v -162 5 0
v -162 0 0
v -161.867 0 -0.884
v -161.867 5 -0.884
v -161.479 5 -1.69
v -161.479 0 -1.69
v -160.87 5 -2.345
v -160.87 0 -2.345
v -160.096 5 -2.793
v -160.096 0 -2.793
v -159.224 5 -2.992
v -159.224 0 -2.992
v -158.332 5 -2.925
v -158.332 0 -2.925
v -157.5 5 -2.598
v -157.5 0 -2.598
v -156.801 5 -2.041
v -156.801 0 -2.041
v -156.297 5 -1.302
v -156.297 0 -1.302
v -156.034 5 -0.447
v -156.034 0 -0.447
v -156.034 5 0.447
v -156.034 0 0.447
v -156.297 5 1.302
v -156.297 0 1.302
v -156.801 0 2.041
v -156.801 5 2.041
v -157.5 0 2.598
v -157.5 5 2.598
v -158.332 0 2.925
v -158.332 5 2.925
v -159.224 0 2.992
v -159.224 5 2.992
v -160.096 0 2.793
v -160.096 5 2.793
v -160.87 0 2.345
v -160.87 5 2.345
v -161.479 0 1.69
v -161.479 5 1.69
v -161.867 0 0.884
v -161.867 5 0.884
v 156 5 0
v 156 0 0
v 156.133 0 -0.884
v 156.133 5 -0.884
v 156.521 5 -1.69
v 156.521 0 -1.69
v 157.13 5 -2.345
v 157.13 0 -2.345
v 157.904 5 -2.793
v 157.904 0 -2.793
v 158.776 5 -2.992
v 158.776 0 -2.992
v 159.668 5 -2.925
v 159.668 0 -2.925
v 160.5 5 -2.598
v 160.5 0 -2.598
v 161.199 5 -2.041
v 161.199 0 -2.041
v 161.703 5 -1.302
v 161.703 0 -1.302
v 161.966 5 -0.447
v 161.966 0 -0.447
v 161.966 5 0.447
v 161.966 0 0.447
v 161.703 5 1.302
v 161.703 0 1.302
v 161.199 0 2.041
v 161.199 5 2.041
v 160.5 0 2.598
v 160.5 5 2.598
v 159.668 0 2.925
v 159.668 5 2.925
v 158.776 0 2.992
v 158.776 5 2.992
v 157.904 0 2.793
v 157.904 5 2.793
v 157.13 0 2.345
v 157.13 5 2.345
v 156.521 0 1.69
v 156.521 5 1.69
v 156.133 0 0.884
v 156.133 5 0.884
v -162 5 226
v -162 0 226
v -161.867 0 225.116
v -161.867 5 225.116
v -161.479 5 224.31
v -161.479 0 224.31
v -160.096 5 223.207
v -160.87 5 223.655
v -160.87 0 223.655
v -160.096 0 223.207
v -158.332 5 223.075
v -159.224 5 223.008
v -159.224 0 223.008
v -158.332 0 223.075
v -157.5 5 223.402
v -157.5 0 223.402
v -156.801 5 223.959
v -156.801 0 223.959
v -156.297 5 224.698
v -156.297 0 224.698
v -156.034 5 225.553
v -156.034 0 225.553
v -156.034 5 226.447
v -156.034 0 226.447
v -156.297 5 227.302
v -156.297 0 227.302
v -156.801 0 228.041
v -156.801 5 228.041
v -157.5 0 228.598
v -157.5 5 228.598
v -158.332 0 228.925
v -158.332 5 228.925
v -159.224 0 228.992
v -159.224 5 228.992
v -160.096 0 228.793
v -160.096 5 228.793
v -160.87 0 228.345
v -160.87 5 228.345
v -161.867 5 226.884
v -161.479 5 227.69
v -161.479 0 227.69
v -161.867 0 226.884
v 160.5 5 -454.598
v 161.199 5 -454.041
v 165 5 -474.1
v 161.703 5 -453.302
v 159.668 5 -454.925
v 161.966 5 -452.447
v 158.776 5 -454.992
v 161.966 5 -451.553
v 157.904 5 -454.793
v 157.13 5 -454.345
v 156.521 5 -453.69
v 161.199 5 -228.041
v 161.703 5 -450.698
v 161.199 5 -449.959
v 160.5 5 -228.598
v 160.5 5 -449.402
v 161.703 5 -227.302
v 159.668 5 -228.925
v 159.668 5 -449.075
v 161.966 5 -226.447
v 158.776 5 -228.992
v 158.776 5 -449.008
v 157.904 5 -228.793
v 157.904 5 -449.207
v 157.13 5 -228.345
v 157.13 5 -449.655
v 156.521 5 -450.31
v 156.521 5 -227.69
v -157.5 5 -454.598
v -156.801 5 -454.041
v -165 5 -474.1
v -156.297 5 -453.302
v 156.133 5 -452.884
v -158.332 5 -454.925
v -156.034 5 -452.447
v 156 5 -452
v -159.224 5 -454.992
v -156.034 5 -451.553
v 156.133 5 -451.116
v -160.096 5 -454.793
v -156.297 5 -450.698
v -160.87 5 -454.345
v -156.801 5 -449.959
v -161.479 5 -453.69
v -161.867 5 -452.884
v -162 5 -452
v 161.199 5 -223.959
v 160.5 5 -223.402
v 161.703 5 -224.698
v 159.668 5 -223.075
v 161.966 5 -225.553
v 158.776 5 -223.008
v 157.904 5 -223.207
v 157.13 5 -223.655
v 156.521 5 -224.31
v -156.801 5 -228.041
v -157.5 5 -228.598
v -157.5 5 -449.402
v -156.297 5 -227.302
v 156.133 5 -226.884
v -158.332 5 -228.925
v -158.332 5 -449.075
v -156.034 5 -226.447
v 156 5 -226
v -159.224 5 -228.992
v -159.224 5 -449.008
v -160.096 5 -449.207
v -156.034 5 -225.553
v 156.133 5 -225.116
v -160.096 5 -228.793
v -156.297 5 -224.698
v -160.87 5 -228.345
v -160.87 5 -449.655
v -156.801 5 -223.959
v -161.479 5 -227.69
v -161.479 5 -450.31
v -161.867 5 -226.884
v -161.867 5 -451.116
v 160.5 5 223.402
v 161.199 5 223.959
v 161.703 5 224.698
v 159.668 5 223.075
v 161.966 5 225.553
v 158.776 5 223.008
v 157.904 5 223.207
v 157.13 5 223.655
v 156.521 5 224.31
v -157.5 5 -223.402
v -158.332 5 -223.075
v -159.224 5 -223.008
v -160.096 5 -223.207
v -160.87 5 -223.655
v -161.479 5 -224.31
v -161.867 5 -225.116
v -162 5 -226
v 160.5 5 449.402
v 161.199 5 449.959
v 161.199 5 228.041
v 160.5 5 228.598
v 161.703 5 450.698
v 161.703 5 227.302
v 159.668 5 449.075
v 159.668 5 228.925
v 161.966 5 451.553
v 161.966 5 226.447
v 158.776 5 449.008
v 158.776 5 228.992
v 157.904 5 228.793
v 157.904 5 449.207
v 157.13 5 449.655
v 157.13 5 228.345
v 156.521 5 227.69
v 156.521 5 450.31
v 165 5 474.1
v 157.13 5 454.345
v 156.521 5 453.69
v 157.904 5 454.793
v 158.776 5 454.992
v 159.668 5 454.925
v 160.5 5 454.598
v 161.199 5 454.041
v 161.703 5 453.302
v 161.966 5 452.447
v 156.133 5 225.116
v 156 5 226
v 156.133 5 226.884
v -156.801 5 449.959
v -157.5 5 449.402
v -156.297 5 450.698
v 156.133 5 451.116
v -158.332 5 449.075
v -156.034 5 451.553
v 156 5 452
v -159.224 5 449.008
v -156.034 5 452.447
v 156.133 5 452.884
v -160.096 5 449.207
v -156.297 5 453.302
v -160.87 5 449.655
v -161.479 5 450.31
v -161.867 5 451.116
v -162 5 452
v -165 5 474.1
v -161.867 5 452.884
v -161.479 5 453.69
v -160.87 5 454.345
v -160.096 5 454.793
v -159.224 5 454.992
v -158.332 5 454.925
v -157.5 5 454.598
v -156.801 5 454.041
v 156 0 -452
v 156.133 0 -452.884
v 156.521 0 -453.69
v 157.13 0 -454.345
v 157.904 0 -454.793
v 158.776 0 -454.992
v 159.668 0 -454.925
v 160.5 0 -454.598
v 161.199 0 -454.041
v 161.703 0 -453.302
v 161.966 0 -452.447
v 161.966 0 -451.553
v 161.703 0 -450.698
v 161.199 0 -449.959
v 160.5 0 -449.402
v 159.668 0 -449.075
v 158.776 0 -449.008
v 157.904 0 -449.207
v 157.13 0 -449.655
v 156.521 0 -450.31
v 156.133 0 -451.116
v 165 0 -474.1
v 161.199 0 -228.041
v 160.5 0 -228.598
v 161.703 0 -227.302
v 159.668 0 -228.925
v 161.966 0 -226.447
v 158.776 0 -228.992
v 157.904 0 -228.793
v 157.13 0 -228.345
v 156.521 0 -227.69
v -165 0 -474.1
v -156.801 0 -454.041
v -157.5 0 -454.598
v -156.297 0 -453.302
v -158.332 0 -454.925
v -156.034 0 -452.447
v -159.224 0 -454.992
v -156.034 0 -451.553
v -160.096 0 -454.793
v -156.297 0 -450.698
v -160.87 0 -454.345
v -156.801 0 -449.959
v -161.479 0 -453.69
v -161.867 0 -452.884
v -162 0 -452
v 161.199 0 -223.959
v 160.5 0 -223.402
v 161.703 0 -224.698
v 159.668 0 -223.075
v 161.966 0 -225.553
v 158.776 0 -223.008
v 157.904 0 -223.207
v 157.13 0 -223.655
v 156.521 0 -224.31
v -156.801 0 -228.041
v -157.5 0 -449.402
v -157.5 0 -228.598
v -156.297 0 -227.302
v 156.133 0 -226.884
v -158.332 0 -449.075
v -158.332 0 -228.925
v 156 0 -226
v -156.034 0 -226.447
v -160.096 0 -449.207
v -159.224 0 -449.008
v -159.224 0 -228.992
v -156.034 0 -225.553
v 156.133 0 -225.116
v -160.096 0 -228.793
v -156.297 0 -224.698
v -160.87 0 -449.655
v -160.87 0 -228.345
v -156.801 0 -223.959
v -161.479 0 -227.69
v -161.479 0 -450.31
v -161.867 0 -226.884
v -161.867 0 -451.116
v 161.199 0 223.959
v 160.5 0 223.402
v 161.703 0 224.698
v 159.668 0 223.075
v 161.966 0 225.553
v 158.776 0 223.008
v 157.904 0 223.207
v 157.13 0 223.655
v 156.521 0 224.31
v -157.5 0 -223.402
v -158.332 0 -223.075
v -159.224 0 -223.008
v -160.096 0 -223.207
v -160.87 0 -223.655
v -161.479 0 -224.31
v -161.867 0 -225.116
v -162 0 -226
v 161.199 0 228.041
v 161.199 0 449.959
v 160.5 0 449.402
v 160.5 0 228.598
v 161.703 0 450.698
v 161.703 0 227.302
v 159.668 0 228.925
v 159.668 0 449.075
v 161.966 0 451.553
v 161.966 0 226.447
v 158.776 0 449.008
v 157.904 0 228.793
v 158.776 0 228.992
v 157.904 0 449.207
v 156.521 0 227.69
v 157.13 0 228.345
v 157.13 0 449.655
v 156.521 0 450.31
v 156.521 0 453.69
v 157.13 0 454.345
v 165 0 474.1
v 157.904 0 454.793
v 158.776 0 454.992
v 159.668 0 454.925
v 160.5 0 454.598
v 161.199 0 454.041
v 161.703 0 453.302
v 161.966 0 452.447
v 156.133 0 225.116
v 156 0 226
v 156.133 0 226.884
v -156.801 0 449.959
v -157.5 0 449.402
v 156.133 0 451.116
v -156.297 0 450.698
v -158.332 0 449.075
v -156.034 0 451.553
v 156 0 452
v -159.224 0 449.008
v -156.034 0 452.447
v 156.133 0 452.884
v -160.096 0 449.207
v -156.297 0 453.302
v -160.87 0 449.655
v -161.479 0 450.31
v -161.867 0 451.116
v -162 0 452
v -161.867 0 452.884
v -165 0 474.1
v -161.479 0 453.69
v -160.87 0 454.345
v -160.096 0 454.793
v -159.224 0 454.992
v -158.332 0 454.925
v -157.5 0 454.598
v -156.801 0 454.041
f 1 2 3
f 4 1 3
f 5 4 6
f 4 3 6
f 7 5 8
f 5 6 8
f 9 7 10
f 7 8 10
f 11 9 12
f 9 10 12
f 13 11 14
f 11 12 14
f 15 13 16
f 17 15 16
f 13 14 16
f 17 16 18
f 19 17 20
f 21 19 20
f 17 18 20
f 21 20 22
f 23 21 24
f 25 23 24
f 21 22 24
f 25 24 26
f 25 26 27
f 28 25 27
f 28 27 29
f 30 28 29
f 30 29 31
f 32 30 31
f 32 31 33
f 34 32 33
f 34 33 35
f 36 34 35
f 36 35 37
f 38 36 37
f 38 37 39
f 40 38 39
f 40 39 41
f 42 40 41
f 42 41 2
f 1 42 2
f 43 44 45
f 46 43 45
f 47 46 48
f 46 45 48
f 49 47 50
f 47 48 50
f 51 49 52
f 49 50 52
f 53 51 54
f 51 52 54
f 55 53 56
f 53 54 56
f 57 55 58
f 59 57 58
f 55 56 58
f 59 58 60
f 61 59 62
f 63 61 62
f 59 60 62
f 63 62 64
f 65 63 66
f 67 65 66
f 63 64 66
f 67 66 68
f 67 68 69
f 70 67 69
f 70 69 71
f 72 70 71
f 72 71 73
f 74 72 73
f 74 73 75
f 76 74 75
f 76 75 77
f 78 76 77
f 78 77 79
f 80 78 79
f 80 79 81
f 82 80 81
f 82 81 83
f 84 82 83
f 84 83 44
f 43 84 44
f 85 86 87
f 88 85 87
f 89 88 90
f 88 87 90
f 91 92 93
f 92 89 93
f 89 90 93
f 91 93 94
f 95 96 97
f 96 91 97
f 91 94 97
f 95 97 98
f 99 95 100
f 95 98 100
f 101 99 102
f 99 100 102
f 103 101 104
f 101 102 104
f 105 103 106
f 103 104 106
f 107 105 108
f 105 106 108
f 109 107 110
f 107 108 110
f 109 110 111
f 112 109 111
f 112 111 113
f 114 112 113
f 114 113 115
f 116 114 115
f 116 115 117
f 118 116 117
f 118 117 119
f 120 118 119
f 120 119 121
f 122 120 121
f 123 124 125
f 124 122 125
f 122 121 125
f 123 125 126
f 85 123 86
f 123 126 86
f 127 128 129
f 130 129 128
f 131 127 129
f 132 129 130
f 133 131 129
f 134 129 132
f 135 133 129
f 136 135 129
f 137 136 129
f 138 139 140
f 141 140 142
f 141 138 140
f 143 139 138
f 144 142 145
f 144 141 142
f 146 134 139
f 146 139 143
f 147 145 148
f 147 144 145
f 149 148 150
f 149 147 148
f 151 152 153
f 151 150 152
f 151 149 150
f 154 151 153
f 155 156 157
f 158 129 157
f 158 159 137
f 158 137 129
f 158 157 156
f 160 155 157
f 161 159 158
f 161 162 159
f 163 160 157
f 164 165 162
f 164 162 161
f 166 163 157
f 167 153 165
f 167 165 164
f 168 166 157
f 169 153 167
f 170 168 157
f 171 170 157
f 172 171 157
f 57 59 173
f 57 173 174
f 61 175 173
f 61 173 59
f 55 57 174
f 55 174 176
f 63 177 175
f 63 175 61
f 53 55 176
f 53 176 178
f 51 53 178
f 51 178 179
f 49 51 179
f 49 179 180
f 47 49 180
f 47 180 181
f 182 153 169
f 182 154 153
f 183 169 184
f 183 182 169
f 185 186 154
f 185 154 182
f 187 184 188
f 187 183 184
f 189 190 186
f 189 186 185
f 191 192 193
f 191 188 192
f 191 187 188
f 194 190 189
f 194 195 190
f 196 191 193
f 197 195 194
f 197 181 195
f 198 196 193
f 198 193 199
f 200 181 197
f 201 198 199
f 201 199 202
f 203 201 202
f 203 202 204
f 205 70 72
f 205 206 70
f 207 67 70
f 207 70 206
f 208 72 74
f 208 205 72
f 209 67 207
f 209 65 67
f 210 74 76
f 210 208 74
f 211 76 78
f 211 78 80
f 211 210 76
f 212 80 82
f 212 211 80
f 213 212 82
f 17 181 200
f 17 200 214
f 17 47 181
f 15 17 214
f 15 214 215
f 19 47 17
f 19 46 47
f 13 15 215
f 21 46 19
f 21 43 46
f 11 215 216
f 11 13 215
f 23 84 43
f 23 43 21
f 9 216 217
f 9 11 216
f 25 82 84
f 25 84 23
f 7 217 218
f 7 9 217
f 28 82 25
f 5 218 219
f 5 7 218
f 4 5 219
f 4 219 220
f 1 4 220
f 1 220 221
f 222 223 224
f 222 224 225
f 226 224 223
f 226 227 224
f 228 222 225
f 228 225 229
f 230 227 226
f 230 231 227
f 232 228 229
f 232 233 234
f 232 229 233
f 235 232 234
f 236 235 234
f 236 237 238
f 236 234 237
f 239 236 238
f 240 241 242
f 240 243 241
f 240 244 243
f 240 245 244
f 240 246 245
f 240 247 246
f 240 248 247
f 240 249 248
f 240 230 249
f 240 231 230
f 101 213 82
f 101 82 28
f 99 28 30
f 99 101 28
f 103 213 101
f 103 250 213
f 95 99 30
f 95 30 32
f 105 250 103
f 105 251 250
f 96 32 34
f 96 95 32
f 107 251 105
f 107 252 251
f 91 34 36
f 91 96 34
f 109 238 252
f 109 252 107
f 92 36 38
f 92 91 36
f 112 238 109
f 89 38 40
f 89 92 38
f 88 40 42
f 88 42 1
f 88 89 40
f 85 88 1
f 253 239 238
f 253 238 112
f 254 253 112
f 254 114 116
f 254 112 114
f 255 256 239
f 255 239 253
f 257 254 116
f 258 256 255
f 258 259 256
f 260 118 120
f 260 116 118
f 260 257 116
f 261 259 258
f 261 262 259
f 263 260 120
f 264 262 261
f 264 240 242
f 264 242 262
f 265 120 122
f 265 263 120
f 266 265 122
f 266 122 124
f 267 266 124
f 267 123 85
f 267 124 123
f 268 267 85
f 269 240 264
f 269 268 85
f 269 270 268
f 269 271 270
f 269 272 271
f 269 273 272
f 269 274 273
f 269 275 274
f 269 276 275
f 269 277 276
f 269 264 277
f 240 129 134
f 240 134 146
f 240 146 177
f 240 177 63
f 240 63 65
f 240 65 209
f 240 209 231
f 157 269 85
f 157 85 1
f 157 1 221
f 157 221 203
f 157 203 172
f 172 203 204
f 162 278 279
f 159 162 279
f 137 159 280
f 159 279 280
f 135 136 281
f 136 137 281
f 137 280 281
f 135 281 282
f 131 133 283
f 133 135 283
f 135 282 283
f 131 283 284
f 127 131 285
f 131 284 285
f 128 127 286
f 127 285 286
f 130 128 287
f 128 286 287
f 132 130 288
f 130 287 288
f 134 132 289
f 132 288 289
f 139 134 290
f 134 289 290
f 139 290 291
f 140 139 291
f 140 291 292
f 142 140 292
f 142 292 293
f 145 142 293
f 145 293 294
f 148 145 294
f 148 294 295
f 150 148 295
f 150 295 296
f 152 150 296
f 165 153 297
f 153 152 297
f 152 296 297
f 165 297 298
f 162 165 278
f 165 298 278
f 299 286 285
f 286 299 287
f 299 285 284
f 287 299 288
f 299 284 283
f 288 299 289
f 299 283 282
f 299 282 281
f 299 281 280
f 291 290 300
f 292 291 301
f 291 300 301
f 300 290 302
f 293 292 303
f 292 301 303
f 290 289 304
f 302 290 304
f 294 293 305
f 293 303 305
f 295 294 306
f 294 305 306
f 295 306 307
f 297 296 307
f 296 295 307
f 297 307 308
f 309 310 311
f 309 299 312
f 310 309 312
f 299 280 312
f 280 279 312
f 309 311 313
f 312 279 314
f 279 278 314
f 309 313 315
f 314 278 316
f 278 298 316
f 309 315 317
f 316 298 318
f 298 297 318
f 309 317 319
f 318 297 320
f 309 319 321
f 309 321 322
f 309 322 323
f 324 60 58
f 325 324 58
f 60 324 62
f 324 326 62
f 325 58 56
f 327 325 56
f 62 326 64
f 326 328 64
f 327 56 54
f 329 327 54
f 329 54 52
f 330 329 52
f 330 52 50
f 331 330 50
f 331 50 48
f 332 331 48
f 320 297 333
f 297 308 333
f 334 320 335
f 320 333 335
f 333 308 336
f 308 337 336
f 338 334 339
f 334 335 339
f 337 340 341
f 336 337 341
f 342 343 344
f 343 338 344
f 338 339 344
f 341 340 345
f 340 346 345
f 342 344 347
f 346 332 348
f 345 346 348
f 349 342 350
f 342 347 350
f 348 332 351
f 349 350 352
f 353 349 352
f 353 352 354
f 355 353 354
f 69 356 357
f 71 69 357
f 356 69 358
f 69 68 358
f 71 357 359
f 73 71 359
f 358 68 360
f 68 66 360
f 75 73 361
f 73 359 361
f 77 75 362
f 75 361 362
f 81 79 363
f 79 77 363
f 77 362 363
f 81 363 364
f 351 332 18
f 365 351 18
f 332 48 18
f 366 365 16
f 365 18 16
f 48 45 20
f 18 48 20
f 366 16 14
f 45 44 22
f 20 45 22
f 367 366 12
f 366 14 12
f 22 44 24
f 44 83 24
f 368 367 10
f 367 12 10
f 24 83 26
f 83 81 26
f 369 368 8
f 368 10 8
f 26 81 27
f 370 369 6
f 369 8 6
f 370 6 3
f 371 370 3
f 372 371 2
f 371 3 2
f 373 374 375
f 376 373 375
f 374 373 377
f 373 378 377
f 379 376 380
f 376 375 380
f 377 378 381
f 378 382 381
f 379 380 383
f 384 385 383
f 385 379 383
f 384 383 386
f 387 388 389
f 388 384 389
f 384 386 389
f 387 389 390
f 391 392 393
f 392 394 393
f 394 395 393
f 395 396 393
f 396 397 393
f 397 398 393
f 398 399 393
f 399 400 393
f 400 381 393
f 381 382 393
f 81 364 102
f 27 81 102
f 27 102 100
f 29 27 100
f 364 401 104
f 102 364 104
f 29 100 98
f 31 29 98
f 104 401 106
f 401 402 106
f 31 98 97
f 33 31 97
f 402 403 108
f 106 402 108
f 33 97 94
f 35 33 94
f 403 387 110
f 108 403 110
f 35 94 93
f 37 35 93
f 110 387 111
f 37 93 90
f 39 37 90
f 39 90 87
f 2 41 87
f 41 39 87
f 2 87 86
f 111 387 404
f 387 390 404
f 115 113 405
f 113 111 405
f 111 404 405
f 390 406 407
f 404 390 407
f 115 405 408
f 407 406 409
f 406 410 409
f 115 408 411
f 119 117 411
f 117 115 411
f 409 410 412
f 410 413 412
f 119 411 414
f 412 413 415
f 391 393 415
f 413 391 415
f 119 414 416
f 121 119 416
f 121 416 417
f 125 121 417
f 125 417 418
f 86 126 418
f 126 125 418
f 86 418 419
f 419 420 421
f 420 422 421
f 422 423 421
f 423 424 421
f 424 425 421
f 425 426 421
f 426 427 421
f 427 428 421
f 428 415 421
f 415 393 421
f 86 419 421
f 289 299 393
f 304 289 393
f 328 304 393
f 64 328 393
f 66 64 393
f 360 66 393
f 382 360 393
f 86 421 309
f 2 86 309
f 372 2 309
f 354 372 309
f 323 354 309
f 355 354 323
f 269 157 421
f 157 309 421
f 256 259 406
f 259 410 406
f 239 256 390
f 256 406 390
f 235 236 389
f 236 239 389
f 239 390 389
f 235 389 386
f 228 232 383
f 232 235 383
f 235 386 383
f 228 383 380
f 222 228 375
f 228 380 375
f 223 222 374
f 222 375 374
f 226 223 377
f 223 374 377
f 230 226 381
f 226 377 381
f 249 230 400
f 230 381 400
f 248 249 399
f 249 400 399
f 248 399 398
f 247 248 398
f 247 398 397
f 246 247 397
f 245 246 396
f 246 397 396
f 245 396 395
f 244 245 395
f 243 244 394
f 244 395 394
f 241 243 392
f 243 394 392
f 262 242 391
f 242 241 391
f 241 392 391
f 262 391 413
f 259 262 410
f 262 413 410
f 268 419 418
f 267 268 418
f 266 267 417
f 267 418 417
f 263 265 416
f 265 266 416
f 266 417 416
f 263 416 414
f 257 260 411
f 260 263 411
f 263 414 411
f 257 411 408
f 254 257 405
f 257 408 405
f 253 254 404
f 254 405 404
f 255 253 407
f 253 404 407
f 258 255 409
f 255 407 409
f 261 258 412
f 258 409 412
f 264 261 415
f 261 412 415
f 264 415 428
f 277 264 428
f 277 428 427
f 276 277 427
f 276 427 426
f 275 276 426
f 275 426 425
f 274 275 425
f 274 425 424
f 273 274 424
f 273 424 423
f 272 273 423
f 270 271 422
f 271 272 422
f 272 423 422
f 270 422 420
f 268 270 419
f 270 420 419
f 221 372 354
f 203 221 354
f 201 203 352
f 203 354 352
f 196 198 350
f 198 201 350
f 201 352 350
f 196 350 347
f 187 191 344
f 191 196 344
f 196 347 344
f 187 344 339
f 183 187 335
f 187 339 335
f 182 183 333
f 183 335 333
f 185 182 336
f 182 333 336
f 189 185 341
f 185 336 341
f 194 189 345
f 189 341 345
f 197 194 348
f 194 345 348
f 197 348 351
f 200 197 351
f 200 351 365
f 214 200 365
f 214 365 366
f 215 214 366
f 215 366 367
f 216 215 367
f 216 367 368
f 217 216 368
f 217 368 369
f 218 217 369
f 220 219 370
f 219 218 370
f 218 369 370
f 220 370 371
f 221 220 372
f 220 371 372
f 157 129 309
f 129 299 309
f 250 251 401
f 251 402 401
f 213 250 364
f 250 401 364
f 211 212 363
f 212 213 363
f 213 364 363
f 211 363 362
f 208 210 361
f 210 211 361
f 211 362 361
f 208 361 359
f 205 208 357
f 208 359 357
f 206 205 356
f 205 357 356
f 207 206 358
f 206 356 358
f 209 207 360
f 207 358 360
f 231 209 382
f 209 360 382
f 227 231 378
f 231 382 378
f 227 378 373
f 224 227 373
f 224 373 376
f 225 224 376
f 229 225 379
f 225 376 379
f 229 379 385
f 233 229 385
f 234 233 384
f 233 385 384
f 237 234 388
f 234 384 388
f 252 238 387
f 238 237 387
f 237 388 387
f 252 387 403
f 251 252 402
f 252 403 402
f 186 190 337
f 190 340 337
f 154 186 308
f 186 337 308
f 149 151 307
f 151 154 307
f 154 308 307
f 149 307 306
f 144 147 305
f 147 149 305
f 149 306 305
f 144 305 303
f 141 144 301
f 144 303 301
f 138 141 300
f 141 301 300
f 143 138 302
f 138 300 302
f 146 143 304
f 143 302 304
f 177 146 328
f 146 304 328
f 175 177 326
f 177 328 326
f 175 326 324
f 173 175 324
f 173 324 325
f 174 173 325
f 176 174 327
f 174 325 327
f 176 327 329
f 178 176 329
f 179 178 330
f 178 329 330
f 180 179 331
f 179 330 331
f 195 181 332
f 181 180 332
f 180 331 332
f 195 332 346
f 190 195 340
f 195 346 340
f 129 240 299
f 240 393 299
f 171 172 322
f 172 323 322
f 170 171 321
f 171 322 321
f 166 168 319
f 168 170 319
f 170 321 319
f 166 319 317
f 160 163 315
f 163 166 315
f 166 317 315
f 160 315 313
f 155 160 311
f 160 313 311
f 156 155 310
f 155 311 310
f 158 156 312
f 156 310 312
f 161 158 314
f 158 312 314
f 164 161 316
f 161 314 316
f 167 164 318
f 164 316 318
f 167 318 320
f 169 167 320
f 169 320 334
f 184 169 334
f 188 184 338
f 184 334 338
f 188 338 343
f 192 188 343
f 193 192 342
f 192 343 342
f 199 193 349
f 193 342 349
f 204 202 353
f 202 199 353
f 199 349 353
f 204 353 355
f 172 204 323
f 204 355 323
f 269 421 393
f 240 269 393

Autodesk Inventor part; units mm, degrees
ref_plane "YZ Plane" through (0, 0, 0) normal (1, 0, 0) x (0, 1, 0)
ref_plane "XZ Plane" through (0, 0, 0) normal (0, 1, 0) x (-1, 0, 0)
ref_plane "XY Plane" through (0, 0, 0) normal (0, 0, 1) x (1, 0, 0)
sketch "Sketch1" plane through (0, 0, 0) normal (0, 1, 0) x (-1, 0, 0)
  line L0 (165, 474.1) -> (-165, 474.1)
  line L1 (-165, 474.1) -> (-165, -474.1)
  line L2 (-165, -474.1) -> (165, -474.1)
  line L3 (165, -474.1) -> (165, 474.1)
  line L4 (0, -663.74) -> (0, 663.74) projected
  line L5 (-231, 0) -> (231, 0) projected
  circle A0 centre (159, -452) radius 3
  circle A1 centre (159, -226) radius 3
  circle A2 centre (159, 0) radius 3
  circle A3 centre (159, 226) radius 3
  circle A4 centre (159, 452) radius 3
  circle A5 centre (-159, -452) radius 3
  circle A6 centre (-159, -226) radius 3
  circle A7 centre (-159, 0) radius 3
  circle A8 centre (-159, 226) radius 3
  circle A9 centre (-159, 452) radius 3
  point P0 (0, 0)
  point P1 (156, 0)
  point P2 (162, 0)
  point P3 (165, 0)
  point P4 (-165, 0)
  point P5 (-162, 0)
  point P6 (-156, 0)
  dimension "d0" = 948.2
  dimension "d1" = 330
  dimension "d4" = 6
  dimension "d5" = 6
  dimension "d6" = 6
  dimension "d7" = 6
  dimension "d8" = 6
  dimension "d9" = 6
  dimension "d10" = 6
  dimension "d11" = 6
  dimension "d12" = 6
  dimension "d13" = 6
  dimension "d14" = 6
  dimension "d15" = 22.1
  dimension "d16" = 22.1
  dimension "d17" = 226
  dimension "d19" = 226
  dimension "d20" = 226
  dimension "d21" = 226
  dimension "d22" = 226
  dimension "d23" = 226
  dimension "d24" = 226
  dimension "d25" = 226
extrude "Extrusion1" add sketch "Sketch1" along normal blind 5 contours L3 L5 A2 L4 L0 | L4 L5 A7 L1 L0 | L3 L2 L4 L5 A2 | L4 L2 L1 L5 A7
properties part number "Base"
